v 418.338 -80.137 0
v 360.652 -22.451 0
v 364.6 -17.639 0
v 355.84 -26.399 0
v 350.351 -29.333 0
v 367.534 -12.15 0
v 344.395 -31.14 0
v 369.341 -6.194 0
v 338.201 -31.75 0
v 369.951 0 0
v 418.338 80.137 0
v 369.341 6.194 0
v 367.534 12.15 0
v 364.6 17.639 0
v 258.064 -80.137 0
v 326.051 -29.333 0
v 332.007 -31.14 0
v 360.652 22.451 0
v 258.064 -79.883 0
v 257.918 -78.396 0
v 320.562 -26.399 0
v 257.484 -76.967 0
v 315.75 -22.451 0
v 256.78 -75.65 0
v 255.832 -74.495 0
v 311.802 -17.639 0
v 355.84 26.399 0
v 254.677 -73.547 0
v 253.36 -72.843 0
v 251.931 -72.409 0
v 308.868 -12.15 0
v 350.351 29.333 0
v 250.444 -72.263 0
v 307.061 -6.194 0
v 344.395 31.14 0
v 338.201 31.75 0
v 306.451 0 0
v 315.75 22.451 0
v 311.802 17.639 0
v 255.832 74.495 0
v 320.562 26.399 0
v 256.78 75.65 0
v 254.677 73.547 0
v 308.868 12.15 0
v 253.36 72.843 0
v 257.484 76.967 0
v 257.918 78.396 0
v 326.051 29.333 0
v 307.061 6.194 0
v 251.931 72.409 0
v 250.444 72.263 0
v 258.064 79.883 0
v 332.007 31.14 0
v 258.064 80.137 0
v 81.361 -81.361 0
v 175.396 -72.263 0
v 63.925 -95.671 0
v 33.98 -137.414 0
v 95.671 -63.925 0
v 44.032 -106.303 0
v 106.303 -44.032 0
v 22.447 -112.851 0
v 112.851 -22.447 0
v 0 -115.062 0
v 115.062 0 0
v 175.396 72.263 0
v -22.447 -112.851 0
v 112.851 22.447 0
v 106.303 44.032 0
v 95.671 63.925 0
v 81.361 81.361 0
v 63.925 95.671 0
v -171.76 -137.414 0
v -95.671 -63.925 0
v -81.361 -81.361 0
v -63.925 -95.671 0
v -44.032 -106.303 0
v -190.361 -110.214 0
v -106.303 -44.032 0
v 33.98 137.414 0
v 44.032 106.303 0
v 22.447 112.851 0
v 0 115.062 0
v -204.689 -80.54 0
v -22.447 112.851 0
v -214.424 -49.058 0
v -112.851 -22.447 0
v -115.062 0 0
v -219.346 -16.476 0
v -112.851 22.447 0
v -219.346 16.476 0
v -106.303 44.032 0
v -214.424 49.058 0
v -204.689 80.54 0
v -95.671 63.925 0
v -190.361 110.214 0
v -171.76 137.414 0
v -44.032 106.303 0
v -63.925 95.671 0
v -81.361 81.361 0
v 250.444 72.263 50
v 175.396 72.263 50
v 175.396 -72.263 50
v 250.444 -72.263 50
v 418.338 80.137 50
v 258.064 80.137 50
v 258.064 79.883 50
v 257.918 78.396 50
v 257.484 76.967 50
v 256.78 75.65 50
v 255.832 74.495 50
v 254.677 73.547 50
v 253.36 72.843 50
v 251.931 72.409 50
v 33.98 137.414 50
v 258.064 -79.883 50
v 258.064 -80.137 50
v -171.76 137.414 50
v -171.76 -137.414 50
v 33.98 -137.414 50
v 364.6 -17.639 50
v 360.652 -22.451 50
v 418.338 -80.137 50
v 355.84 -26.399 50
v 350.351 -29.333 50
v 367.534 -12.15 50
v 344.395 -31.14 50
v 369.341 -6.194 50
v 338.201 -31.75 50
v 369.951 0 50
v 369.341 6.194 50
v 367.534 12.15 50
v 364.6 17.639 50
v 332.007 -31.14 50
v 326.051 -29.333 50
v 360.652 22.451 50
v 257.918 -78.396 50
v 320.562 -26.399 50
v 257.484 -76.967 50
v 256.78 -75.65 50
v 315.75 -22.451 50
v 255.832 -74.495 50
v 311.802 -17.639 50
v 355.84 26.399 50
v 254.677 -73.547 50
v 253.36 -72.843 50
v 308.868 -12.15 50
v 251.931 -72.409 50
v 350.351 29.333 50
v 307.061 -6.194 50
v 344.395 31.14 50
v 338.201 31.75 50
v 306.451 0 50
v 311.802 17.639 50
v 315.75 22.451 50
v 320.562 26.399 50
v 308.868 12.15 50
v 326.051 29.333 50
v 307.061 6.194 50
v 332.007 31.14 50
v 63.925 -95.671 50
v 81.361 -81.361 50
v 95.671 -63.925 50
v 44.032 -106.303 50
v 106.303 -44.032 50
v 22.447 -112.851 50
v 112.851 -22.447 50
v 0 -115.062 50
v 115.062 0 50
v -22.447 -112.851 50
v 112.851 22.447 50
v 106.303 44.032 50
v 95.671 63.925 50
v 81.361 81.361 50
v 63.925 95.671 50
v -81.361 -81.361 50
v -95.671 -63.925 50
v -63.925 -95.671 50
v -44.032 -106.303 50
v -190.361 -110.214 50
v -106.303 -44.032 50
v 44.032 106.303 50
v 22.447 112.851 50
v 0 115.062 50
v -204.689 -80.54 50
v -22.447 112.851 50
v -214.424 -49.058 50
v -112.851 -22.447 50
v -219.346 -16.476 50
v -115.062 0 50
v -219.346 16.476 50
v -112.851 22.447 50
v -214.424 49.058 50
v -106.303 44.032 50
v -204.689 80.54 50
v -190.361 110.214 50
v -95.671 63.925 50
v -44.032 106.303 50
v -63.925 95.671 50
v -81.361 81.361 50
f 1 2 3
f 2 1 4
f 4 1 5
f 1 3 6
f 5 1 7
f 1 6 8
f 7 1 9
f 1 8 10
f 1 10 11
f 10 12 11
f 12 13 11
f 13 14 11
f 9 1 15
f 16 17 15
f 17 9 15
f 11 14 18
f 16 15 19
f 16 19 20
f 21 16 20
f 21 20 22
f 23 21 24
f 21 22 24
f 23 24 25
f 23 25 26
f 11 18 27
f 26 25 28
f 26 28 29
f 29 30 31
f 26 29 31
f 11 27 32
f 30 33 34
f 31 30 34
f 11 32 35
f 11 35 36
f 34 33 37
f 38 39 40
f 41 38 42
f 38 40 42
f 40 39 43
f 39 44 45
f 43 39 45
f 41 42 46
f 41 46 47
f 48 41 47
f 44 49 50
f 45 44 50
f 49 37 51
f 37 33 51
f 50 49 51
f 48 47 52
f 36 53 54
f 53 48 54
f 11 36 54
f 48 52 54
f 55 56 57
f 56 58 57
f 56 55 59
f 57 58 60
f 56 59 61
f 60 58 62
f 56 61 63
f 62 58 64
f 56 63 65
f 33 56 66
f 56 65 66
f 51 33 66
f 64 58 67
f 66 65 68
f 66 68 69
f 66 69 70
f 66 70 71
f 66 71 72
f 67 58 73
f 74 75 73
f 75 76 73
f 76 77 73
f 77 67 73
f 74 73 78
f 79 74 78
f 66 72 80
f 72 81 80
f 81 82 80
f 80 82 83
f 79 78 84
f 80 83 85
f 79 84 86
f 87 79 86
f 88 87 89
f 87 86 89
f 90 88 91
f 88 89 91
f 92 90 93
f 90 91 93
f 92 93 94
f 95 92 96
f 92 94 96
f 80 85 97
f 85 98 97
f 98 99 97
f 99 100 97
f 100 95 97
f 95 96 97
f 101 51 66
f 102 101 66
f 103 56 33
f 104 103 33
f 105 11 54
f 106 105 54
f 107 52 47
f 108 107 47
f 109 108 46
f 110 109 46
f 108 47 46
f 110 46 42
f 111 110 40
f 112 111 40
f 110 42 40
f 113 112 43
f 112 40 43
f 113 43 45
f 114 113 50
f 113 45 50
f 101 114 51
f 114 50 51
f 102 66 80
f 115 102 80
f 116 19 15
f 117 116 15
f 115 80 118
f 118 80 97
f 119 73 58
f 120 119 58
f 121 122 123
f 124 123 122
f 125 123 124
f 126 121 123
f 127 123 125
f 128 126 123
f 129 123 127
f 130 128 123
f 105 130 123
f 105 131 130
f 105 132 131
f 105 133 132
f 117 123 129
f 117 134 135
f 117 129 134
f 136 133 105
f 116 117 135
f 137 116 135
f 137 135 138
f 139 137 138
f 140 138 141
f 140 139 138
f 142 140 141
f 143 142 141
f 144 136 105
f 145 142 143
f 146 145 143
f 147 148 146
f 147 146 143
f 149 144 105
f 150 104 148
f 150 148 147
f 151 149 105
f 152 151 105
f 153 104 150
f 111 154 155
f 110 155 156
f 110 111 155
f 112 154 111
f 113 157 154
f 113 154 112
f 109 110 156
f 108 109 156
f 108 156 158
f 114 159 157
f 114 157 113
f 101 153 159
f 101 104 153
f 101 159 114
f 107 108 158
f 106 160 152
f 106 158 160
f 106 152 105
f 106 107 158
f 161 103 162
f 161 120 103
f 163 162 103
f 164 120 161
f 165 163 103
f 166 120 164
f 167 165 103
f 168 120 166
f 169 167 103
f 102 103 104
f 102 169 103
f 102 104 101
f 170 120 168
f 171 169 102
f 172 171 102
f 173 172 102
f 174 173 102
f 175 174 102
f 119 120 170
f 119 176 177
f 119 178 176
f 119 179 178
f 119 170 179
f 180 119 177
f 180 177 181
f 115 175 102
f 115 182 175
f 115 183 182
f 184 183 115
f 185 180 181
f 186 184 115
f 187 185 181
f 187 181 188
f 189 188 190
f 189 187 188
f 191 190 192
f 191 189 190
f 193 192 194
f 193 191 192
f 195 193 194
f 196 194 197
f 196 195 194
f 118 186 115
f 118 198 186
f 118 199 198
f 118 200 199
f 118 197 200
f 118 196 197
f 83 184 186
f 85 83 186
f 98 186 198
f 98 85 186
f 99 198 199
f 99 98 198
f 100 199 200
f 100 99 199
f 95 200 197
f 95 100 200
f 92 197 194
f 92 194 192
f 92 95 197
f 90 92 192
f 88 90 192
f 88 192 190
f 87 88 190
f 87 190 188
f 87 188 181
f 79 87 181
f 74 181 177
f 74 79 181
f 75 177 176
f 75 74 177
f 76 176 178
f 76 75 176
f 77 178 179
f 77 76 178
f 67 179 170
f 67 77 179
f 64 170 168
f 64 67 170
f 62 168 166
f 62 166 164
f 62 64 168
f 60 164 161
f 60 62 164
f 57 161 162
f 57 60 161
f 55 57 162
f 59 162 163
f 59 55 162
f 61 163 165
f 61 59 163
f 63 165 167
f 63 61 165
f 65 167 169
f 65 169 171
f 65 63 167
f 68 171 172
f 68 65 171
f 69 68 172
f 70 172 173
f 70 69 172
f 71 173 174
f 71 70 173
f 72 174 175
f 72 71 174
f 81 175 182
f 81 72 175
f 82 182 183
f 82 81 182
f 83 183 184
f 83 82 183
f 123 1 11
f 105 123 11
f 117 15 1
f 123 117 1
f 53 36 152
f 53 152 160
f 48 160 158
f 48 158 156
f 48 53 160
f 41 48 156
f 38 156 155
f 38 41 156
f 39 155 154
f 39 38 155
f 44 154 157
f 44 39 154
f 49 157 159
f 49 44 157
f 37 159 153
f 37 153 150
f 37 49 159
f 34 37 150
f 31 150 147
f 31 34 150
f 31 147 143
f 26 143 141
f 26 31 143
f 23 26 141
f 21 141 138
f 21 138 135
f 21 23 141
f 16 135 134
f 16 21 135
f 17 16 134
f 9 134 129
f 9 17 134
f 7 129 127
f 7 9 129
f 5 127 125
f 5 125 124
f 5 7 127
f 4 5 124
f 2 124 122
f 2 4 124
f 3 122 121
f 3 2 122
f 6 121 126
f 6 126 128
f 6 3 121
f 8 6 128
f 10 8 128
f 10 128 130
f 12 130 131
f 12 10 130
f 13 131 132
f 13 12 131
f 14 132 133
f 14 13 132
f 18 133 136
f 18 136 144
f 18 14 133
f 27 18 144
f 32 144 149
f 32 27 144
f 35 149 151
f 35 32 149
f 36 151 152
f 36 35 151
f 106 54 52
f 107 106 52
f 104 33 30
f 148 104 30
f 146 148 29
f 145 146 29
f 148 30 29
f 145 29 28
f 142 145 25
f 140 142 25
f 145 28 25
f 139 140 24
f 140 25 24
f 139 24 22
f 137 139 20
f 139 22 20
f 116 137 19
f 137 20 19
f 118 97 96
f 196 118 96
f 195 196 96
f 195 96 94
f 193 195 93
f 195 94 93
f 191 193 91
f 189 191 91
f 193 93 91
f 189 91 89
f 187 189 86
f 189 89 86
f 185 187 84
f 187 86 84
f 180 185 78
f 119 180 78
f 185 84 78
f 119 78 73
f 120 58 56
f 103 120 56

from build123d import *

# Parameters (mm, degrees)
CROQUIS1_R                   = 115.062
CROQUIS1_R_2                 = 31.75
SALIENTE_EXTRUIR1_DEPTH      = 50
CORPS_D_PLACER_COPIER1_ANGLE = 90


with BuildPart() as part:
    # Croquis1 → Saliente-Extruir1 (new body)
    with BuildSketch(Plane.XY):
        with BuildLine():
            Line((-72.263, -175.395747529), (-72.263, -249.055747529))
            Line((-72.263, -249.055747529), (-72.263, -250.444))
            ThreePointArc((-72.263, -250.444), (-74.494846327, -255.832153673), (-79.883, -258.064))
            Line((-79.883, -258.064), (-80.137, -258.064))
            Line((-80.137, -258.064), (-80.137, -418.338))
            Line((-80.137, -418.338), (80.137, -418.338))
            Line((80.137, -418.338), (80.137, -258.064))
            Line((80.137, -258.064), (79.883, -258.064))
            ThreePointArc((79.883, -258.064), (74.494846327, -255.832153673), (72.263, -250.444))
            Line((72.263, -250.444), (72.263, -249.055747529))
            Line((72.263, -249.055747529), (72.263, -175.395747529))
            Line((72.263, -175.395747529), (137.414, -33.979836109))
            Line((137.414, -33.979836109), (137.414, 171.760163891))
            ThreePointArc((137.414, 171.760163891), (0, 219.964), (-137.414, 171.760163891))
            Line((-137.414, 171.760163891), (-137.414, -33.979836109))
            Line((-137.414, -33.979836109), (-72.263, -175.395747529))
        make_face()
        Circle(CROQUIS1_R, mode=Mode.SUBTRACT)
        with Locations((0, -338.201)):
            Circle(CROQUIS1_R_2, mode=Mode.SUBTRACT)
    extrude(amount=SALIENTE_EXTRUIR1_DEPTH)


with BuildPart() as part_1:
    # Corps-Déplacer/Copier1: moved
    add(part.part.rotate(Axis((0, 0, 0), (0, 0, 1)), CORPS_D_PLACER_COPIER1_ANGLE))


solid = part_1.part
